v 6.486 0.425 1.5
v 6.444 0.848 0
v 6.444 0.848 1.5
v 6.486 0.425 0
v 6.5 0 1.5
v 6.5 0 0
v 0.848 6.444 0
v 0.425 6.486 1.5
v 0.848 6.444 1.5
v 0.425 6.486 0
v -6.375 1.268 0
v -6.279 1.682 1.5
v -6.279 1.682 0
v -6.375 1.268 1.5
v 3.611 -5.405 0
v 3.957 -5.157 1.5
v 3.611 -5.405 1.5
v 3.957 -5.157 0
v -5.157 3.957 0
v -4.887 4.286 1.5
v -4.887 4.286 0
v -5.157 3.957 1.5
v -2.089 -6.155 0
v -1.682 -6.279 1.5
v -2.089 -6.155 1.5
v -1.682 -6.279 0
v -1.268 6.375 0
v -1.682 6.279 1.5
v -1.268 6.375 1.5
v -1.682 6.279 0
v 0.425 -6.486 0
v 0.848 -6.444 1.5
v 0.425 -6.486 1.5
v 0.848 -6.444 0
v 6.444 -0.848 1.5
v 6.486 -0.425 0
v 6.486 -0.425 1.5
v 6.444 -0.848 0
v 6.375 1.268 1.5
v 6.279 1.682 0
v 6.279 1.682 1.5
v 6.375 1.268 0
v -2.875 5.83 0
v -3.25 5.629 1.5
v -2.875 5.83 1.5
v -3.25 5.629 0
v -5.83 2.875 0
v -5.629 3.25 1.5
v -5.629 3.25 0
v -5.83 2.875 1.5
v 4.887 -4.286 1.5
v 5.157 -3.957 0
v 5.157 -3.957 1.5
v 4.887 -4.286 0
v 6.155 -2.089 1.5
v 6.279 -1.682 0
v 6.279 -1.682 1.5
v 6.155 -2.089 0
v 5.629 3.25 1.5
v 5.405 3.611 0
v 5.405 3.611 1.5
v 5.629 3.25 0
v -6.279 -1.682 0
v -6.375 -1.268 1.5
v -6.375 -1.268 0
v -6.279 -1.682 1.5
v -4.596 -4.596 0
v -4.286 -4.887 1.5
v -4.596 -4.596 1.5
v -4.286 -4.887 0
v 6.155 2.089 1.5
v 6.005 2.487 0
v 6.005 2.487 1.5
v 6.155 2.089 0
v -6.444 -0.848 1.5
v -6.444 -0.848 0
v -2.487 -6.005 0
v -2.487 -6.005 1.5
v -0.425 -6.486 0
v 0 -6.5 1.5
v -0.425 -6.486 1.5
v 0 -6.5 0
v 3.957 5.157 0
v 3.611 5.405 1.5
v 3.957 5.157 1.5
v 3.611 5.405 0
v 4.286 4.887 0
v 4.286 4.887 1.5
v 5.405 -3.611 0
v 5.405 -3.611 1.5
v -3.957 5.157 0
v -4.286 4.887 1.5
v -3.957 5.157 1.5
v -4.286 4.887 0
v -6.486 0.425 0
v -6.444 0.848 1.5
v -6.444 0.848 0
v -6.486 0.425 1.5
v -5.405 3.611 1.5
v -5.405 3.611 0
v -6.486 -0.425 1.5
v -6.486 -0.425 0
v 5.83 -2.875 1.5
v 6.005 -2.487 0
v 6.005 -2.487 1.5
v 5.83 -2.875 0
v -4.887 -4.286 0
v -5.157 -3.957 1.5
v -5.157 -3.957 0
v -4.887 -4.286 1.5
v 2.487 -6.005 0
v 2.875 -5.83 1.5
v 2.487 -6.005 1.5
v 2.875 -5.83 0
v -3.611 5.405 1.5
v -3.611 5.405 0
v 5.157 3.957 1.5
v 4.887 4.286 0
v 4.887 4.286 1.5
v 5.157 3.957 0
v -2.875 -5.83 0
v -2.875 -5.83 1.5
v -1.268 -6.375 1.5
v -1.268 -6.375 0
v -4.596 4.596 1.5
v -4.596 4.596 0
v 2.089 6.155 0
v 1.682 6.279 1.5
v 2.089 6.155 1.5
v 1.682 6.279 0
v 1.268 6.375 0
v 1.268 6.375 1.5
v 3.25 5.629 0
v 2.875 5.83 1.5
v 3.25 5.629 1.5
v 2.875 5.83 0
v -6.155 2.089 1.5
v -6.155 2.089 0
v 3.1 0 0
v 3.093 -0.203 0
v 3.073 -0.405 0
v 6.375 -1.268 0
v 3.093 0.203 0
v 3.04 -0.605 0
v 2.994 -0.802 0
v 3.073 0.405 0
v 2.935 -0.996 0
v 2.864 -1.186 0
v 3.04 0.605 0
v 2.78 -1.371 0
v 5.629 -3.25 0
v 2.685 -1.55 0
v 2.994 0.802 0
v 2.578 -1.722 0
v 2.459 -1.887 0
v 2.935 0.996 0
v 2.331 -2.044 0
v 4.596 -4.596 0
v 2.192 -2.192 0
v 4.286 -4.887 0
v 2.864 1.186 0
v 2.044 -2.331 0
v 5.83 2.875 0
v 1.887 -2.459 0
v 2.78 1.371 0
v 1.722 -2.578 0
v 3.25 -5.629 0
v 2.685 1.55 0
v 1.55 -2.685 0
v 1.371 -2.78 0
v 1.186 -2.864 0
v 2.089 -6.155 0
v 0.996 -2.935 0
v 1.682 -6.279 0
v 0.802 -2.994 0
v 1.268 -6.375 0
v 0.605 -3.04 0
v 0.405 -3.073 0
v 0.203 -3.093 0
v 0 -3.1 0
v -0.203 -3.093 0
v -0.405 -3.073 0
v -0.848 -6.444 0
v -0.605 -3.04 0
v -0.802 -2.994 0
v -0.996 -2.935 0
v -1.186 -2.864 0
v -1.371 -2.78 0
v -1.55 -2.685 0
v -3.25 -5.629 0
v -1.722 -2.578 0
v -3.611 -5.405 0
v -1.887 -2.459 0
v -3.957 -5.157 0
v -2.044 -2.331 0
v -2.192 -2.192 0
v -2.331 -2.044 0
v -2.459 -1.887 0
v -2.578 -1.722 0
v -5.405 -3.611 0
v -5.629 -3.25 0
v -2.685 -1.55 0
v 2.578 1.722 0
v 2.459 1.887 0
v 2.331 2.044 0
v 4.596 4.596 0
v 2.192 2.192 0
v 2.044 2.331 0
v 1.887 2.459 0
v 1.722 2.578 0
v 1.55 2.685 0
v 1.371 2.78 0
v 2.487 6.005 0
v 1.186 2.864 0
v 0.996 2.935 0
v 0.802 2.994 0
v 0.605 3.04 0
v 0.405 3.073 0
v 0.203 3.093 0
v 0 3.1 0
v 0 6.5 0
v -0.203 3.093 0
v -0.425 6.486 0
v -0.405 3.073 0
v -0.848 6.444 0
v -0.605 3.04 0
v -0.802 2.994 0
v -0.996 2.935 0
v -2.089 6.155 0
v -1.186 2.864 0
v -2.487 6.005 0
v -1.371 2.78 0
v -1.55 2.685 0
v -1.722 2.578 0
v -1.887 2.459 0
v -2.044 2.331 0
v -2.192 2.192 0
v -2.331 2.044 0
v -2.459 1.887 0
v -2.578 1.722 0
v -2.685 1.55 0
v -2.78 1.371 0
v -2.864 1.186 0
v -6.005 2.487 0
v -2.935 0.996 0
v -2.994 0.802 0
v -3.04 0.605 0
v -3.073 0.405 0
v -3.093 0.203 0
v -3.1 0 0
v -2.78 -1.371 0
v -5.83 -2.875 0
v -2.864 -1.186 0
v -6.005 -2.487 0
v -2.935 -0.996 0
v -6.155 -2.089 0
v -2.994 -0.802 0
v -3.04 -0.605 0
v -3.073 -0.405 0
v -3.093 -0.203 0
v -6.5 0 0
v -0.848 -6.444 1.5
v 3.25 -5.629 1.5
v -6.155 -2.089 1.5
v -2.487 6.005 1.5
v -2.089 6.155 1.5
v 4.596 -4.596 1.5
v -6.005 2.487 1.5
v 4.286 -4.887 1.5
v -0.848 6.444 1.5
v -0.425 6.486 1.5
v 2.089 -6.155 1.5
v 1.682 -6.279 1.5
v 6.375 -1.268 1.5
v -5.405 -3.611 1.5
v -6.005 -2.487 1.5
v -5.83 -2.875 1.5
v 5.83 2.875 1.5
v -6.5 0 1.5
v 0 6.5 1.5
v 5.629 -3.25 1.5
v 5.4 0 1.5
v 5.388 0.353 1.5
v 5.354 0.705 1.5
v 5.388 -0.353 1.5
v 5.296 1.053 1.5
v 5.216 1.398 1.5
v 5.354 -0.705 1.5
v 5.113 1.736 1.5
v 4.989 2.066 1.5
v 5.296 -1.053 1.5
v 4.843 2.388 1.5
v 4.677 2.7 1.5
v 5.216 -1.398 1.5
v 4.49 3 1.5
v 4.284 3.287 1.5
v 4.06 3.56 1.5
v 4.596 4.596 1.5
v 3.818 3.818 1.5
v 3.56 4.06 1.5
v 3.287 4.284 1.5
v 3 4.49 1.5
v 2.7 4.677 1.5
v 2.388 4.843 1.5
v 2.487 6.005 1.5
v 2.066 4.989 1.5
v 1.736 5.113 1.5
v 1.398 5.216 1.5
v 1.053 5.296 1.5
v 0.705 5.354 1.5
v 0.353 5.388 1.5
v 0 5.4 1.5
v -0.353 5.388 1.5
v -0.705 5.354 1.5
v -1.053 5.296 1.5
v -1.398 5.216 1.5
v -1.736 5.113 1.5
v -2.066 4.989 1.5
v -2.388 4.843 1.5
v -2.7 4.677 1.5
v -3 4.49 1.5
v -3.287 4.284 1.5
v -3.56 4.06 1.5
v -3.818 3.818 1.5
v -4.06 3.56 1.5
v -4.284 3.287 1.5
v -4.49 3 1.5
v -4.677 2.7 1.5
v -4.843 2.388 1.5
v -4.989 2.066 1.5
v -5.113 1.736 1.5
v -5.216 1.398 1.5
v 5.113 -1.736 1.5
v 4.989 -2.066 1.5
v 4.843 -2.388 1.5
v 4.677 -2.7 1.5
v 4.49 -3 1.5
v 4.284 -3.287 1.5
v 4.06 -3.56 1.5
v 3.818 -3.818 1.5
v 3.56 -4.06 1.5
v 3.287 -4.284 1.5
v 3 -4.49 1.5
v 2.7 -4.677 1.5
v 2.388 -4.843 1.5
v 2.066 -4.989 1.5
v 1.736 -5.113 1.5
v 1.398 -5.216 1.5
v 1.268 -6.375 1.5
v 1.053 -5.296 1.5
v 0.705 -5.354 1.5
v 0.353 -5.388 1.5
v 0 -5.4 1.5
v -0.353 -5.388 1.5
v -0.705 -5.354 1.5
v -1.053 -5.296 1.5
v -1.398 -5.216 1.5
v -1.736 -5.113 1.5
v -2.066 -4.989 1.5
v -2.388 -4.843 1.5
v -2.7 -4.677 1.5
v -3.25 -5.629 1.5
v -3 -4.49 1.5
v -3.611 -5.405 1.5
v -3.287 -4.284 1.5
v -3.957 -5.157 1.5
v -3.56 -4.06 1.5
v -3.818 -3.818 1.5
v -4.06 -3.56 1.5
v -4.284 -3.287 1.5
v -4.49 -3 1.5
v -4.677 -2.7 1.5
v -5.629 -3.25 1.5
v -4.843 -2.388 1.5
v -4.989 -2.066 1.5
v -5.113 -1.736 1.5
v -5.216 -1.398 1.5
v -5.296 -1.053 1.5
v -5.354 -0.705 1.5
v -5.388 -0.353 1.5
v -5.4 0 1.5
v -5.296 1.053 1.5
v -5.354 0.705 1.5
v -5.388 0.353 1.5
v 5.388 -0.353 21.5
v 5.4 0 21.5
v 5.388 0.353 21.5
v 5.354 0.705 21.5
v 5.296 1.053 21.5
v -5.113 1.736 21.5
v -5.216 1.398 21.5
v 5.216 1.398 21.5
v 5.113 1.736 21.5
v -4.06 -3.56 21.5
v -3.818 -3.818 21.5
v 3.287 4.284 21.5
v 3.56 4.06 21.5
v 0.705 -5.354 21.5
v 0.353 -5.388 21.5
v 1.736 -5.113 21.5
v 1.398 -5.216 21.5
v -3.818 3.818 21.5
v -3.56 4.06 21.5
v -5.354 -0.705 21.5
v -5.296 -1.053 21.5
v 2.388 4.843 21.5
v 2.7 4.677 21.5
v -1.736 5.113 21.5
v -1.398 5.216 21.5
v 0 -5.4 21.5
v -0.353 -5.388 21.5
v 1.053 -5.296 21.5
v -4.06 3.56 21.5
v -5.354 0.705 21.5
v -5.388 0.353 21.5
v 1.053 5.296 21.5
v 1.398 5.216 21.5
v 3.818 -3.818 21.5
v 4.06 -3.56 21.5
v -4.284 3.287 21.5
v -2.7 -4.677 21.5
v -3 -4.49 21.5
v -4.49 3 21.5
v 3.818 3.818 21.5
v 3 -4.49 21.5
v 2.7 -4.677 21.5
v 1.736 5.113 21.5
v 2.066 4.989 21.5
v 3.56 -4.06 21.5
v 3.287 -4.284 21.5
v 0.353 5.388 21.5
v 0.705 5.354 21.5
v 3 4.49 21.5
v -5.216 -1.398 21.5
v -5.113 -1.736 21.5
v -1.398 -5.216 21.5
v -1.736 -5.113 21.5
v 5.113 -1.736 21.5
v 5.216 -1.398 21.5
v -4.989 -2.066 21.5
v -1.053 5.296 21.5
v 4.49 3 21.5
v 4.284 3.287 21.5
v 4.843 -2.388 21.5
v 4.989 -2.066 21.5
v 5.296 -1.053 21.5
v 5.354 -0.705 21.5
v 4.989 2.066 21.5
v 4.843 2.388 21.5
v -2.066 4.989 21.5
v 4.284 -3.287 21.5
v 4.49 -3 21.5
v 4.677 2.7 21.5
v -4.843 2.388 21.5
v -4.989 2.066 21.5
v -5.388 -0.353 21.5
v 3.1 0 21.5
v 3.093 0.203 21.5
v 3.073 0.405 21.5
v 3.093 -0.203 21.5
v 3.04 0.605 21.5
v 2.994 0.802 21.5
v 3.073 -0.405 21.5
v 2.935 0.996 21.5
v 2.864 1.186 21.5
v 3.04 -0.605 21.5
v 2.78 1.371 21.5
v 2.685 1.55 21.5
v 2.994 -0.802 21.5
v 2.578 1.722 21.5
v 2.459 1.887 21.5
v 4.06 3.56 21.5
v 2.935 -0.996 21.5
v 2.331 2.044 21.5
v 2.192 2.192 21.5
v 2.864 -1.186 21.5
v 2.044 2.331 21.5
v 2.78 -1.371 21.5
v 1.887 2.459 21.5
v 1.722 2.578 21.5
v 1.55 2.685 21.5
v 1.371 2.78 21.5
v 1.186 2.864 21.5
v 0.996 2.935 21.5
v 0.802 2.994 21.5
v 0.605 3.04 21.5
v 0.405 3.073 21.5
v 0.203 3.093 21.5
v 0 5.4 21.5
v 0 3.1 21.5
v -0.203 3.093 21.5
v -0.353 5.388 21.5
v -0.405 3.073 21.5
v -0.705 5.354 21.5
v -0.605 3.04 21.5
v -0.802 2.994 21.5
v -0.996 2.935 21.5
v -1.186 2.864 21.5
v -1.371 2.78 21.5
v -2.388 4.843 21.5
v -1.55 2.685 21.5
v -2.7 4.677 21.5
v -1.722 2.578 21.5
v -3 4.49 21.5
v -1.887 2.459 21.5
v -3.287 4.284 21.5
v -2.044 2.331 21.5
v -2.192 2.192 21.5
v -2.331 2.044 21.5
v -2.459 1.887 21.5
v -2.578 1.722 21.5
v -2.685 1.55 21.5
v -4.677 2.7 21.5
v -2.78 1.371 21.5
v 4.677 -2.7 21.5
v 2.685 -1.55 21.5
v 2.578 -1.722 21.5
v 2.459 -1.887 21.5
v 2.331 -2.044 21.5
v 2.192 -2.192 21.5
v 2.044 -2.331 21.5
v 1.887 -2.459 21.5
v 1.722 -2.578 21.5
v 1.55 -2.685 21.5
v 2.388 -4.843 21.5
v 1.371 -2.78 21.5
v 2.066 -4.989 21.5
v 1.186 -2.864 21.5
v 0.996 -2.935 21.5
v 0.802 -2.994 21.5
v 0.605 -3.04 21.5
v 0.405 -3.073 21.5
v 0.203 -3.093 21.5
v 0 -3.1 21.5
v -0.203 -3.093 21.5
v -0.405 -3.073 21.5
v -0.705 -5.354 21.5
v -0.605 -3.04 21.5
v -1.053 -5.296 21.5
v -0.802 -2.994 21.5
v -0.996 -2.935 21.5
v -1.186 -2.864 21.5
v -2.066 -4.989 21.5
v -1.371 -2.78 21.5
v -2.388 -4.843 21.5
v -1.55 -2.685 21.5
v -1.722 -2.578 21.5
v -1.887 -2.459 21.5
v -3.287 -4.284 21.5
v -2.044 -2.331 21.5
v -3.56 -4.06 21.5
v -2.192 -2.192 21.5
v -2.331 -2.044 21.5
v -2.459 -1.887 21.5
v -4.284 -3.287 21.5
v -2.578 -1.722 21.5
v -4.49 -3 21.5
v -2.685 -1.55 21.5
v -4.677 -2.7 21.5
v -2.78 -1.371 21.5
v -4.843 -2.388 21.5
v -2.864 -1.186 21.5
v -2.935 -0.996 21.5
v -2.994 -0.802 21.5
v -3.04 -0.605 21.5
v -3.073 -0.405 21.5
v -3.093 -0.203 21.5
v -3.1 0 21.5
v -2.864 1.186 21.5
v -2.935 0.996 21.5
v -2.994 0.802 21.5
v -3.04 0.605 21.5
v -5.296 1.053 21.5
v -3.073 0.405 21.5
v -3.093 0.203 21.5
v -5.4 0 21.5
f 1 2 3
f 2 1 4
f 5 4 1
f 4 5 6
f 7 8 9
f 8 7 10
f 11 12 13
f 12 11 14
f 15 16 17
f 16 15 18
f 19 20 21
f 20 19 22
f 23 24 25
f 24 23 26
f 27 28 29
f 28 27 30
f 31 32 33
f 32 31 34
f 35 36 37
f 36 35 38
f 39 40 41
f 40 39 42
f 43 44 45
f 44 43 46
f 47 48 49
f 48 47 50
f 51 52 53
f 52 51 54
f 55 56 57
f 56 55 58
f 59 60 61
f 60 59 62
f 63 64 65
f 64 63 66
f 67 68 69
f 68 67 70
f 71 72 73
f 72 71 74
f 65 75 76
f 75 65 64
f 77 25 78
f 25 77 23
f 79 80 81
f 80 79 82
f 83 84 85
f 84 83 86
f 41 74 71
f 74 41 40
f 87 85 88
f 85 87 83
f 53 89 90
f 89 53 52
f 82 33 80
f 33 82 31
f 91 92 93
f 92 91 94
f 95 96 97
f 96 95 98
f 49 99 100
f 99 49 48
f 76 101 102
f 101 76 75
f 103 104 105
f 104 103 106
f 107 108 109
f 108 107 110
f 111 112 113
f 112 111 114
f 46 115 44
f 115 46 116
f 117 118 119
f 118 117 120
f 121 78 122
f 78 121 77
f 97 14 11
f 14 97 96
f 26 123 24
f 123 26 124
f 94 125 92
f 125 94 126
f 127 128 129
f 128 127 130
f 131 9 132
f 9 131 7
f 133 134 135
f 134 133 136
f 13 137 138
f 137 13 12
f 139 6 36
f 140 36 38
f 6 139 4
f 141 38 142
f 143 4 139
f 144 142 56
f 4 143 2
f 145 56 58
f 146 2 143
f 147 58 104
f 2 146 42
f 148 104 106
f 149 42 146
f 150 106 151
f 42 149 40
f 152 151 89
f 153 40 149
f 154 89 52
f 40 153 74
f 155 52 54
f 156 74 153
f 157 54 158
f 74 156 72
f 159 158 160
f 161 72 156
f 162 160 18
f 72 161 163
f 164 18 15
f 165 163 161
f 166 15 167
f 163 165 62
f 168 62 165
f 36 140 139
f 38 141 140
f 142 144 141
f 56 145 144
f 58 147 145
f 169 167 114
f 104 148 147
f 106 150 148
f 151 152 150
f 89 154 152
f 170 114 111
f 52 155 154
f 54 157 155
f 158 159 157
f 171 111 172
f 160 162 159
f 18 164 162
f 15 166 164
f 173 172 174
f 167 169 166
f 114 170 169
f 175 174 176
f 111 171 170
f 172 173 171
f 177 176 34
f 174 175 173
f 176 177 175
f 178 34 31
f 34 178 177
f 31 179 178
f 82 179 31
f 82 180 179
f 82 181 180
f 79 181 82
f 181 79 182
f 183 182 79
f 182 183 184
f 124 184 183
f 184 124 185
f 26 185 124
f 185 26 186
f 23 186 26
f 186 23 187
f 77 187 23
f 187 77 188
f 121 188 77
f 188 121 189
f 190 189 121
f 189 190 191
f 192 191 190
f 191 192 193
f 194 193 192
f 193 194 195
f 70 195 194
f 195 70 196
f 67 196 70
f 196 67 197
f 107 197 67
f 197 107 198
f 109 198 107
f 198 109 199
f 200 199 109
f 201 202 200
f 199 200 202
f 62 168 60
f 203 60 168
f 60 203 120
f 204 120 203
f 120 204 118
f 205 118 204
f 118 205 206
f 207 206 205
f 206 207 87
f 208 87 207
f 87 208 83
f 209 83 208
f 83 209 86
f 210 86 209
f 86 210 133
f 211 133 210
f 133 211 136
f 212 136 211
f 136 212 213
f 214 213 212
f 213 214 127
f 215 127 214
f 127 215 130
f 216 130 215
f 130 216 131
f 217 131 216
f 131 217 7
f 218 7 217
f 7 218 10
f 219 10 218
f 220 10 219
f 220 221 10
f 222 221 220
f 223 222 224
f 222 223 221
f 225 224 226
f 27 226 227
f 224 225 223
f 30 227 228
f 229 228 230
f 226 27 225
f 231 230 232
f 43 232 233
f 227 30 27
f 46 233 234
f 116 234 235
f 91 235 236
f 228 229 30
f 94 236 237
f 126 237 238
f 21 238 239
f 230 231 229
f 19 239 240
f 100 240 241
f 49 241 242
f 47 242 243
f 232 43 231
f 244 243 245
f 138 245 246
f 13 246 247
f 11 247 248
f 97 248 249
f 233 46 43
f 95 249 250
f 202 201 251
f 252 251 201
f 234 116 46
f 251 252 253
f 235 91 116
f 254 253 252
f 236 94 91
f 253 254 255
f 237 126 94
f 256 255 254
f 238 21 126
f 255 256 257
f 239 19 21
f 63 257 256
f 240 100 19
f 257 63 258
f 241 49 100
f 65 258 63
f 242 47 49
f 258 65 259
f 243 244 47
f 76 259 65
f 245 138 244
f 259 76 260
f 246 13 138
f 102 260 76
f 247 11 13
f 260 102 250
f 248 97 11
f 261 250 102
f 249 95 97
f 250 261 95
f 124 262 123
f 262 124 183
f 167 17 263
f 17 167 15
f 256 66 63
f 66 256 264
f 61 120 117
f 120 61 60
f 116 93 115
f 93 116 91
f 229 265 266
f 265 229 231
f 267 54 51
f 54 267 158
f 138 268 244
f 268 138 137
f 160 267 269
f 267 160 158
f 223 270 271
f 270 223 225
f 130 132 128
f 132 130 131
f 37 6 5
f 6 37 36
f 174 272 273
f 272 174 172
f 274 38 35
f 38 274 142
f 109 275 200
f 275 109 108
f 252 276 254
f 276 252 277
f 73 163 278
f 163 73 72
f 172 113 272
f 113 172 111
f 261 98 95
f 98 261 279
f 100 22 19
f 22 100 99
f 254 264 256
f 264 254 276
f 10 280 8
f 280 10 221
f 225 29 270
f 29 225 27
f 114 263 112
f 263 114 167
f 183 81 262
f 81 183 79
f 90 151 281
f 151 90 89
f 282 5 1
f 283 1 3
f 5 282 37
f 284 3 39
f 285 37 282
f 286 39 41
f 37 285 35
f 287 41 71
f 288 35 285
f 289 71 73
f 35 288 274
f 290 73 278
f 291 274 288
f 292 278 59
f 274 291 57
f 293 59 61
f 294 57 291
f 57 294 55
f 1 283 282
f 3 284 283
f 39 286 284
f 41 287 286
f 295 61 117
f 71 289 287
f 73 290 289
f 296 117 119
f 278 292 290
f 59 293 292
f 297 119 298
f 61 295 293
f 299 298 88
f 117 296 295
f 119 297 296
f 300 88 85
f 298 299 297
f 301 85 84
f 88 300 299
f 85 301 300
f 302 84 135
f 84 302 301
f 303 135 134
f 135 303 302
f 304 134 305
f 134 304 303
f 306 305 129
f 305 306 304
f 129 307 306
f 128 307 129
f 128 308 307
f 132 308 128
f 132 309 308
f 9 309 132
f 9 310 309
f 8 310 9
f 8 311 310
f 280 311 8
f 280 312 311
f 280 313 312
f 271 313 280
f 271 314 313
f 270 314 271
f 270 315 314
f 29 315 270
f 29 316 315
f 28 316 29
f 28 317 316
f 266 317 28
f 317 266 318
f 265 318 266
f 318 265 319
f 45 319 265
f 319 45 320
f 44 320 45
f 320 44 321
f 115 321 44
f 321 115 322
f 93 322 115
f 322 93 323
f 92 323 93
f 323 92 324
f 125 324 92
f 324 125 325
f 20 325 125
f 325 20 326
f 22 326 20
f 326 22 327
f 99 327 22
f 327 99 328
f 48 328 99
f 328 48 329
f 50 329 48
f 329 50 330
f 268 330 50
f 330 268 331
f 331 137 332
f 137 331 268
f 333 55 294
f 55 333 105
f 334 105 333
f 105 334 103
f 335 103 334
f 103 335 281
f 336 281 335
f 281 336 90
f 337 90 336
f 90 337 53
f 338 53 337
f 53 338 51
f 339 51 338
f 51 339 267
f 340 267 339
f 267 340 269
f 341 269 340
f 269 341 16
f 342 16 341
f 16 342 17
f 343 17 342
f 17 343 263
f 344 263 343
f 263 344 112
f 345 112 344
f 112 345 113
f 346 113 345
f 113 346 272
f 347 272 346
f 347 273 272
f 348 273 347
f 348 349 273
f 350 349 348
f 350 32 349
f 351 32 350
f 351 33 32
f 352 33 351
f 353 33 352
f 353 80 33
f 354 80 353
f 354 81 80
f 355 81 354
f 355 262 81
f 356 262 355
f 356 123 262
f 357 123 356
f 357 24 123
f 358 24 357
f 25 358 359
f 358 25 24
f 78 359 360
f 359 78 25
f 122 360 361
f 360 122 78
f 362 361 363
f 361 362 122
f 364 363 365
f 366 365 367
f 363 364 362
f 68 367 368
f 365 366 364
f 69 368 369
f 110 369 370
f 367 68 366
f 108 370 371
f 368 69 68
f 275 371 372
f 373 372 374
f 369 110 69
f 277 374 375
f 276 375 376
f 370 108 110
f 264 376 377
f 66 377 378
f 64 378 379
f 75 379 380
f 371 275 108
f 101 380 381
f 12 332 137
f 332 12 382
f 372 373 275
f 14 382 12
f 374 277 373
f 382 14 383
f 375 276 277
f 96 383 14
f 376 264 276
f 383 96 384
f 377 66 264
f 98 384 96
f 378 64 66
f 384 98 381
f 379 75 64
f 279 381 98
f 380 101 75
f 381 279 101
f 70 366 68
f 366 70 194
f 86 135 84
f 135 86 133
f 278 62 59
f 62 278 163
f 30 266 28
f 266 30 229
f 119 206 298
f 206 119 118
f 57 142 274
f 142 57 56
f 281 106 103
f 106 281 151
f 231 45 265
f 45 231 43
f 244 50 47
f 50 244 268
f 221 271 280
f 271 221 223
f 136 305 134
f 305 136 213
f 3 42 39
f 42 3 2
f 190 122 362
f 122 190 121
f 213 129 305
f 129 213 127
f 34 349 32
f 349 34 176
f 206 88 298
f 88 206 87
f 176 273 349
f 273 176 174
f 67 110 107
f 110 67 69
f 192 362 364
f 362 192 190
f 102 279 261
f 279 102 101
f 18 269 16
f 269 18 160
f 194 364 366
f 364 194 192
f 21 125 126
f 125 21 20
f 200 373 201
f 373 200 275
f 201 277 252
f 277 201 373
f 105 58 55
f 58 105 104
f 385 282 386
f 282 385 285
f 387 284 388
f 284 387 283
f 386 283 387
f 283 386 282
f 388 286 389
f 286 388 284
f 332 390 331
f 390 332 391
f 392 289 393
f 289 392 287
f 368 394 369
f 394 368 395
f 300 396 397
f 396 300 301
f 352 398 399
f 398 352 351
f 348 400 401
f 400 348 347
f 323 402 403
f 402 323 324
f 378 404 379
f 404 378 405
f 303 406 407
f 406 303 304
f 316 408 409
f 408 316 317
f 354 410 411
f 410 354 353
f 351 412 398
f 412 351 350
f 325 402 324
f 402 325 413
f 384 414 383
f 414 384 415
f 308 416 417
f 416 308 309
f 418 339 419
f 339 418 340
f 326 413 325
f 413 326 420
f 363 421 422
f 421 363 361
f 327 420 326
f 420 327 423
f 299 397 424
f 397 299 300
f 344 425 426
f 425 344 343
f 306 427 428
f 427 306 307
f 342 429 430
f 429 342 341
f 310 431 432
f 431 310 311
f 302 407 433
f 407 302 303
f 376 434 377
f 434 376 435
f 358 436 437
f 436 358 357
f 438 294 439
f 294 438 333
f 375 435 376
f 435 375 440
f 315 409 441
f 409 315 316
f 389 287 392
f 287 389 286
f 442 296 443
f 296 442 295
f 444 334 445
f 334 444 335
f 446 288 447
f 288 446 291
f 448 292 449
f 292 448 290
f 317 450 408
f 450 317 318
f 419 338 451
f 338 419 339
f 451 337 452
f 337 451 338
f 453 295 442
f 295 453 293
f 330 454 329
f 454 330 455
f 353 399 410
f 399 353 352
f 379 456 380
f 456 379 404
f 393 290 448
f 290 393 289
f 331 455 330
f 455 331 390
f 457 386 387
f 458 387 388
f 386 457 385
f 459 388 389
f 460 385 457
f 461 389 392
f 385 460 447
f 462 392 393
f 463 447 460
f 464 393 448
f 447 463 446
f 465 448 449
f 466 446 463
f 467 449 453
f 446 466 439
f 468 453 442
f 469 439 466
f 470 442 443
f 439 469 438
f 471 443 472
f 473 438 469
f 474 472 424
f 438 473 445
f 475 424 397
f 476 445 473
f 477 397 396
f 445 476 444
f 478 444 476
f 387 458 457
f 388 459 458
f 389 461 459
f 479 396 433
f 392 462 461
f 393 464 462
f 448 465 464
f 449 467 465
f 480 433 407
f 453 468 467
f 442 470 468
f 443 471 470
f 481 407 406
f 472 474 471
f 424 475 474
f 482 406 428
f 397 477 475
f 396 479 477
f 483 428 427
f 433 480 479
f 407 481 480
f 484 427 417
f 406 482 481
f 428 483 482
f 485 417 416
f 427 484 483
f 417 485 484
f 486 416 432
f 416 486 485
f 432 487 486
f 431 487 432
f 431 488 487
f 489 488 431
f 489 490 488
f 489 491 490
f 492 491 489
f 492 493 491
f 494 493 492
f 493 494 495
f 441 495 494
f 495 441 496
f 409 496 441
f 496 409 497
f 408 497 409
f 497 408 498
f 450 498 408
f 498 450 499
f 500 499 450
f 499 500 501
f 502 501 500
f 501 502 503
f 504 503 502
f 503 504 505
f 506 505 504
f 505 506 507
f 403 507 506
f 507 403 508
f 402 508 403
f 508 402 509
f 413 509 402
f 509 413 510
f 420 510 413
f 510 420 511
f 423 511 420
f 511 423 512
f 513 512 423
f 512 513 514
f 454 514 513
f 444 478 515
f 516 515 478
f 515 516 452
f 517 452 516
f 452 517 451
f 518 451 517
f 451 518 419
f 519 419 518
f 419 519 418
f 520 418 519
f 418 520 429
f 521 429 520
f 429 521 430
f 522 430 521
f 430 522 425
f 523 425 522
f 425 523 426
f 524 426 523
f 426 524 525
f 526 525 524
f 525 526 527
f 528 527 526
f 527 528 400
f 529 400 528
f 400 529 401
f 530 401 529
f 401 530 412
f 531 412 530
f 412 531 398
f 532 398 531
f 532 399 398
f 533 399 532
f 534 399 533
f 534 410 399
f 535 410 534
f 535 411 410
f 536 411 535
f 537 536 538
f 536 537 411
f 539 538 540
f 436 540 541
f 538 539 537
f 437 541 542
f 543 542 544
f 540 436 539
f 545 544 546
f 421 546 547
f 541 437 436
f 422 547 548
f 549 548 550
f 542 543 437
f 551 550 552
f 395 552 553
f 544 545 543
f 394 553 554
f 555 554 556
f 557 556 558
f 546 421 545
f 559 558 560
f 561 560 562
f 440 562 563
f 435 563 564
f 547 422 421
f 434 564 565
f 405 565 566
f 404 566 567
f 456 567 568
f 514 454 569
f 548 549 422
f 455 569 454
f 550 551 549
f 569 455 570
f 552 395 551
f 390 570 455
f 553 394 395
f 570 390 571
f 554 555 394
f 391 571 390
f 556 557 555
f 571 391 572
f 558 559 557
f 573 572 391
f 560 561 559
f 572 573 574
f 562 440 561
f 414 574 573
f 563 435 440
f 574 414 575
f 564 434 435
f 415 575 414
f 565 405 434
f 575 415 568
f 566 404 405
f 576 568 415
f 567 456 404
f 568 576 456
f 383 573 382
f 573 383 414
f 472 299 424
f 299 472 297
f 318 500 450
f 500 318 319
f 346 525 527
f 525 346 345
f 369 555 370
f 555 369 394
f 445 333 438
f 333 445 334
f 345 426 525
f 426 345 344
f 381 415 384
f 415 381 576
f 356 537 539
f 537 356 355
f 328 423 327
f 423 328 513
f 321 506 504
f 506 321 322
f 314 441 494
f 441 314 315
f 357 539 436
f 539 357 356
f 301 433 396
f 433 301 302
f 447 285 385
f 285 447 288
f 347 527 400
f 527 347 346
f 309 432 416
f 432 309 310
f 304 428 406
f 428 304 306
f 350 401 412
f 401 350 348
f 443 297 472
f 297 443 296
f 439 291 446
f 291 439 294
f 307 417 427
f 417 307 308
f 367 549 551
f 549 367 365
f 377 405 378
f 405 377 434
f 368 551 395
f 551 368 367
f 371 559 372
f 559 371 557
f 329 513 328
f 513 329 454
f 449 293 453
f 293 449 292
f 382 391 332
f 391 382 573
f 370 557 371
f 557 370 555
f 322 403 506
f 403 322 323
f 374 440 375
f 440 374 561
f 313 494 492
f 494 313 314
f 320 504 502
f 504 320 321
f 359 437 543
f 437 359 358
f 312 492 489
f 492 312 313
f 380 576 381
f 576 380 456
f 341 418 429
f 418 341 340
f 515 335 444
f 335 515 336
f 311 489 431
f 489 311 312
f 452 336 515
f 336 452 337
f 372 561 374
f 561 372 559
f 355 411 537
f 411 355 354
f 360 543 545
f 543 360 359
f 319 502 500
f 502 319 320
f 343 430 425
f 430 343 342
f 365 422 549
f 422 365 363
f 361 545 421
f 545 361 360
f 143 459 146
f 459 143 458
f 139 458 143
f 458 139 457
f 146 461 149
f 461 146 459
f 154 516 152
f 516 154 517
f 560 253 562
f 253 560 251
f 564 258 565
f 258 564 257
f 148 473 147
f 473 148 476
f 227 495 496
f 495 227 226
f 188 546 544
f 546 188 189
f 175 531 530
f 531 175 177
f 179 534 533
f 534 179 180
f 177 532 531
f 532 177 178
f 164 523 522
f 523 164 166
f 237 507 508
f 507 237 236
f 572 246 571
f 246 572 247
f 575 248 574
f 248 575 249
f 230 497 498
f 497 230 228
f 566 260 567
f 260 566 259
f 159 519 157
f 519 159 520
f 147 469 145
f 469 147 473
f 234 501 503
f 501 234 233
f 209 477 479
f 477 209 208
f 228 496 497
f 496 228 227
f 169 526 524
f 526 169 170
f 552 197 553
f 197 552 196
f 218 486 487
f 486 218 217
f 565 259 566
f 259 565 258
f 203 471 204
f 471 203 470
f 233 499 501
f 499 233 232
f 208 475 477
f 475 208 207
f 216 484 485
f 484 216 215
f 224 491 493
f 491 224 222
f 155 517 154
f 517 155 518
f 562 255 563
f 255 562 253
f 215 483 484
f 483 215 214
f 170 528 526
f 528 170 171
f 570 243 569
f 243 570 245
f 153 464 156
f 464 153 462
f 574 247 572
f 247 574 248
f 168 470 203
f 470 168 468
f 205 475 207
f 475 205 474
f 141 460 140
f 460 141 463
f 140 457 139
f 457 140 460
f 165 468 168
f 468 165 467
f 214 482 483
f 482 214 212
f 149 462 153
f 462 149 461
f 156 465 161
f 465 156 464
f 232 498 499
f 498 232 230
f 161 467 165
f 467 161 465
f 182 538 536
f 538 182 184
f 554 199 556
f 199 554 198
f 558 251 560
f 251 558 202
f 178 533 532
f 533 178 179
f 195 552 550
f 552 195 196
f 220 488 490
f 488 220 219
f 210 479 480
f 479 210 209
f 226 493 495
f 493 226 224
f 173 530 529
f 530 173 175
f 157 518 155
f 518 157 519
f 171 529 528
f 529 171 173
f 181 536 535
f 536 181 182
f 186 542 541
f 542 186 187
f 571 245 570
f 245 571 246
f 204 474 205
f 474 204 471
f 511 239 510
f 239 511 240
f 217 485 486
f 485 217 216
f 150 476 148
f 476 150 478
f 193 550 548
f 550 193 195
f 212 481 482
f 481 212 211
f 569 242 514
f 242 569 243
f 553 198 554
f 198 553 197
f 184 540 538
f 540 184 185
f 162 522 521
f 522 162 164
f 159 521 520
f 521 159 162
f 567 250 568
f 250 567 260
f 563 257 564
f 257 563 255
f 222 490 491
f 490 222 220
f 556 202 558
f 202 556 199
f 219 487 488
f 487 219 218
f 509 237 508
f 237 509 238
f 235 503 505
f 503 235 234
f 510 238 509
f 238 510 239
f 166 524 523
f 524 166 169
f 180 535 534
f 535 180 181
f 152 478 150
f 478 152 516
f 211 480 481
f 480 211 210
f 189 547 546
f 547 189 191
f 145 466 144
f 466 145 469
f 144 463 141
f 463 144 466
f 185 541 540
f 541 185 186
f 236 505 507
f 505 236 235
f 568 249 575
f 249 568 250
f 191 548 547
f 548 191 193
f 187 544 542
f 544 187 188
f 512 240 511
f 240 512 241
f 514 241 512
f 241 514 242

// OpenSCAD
// PCR tube adapter sleeve: 0.2 mL tube in a 1.5 mL rack hole
// Print orientation: collar on the bed (z = 0), sleeve body rises to z = 21.5

// ---------- Parameters ----------
collar_d        = 13;    // collar outer diameter
collar_h        = 1.5;   // collar thickness (z = 0 to 1.5)
sleeve_od       = 10.8;  // sleeve body outer diameter
sleeve_top_z    = 21.5;  // top of sleeve body
bore_d          = 6.2;   // through-bore diameter
eps             = 0.5;   // cutter overshoot past faces

$fn = 96;

// ---------- Model ----------
difference() {
    union() {
        // Collar
        cylinder(d = collar_d, h = collar_h);
        // Sleeve body (overlaps collar slightly for a clean union)
        translate([0, 0, collar_h - 0.01])
            cylinder(d = sleeve_od, h = sleeve_top_z - collar_h + 0.01);
    }
    // Full-height bore
    translate([0, 0, -eps])
        cylinder(d = bore_d, h = sleeve_top_z + 2 * eps);
}
